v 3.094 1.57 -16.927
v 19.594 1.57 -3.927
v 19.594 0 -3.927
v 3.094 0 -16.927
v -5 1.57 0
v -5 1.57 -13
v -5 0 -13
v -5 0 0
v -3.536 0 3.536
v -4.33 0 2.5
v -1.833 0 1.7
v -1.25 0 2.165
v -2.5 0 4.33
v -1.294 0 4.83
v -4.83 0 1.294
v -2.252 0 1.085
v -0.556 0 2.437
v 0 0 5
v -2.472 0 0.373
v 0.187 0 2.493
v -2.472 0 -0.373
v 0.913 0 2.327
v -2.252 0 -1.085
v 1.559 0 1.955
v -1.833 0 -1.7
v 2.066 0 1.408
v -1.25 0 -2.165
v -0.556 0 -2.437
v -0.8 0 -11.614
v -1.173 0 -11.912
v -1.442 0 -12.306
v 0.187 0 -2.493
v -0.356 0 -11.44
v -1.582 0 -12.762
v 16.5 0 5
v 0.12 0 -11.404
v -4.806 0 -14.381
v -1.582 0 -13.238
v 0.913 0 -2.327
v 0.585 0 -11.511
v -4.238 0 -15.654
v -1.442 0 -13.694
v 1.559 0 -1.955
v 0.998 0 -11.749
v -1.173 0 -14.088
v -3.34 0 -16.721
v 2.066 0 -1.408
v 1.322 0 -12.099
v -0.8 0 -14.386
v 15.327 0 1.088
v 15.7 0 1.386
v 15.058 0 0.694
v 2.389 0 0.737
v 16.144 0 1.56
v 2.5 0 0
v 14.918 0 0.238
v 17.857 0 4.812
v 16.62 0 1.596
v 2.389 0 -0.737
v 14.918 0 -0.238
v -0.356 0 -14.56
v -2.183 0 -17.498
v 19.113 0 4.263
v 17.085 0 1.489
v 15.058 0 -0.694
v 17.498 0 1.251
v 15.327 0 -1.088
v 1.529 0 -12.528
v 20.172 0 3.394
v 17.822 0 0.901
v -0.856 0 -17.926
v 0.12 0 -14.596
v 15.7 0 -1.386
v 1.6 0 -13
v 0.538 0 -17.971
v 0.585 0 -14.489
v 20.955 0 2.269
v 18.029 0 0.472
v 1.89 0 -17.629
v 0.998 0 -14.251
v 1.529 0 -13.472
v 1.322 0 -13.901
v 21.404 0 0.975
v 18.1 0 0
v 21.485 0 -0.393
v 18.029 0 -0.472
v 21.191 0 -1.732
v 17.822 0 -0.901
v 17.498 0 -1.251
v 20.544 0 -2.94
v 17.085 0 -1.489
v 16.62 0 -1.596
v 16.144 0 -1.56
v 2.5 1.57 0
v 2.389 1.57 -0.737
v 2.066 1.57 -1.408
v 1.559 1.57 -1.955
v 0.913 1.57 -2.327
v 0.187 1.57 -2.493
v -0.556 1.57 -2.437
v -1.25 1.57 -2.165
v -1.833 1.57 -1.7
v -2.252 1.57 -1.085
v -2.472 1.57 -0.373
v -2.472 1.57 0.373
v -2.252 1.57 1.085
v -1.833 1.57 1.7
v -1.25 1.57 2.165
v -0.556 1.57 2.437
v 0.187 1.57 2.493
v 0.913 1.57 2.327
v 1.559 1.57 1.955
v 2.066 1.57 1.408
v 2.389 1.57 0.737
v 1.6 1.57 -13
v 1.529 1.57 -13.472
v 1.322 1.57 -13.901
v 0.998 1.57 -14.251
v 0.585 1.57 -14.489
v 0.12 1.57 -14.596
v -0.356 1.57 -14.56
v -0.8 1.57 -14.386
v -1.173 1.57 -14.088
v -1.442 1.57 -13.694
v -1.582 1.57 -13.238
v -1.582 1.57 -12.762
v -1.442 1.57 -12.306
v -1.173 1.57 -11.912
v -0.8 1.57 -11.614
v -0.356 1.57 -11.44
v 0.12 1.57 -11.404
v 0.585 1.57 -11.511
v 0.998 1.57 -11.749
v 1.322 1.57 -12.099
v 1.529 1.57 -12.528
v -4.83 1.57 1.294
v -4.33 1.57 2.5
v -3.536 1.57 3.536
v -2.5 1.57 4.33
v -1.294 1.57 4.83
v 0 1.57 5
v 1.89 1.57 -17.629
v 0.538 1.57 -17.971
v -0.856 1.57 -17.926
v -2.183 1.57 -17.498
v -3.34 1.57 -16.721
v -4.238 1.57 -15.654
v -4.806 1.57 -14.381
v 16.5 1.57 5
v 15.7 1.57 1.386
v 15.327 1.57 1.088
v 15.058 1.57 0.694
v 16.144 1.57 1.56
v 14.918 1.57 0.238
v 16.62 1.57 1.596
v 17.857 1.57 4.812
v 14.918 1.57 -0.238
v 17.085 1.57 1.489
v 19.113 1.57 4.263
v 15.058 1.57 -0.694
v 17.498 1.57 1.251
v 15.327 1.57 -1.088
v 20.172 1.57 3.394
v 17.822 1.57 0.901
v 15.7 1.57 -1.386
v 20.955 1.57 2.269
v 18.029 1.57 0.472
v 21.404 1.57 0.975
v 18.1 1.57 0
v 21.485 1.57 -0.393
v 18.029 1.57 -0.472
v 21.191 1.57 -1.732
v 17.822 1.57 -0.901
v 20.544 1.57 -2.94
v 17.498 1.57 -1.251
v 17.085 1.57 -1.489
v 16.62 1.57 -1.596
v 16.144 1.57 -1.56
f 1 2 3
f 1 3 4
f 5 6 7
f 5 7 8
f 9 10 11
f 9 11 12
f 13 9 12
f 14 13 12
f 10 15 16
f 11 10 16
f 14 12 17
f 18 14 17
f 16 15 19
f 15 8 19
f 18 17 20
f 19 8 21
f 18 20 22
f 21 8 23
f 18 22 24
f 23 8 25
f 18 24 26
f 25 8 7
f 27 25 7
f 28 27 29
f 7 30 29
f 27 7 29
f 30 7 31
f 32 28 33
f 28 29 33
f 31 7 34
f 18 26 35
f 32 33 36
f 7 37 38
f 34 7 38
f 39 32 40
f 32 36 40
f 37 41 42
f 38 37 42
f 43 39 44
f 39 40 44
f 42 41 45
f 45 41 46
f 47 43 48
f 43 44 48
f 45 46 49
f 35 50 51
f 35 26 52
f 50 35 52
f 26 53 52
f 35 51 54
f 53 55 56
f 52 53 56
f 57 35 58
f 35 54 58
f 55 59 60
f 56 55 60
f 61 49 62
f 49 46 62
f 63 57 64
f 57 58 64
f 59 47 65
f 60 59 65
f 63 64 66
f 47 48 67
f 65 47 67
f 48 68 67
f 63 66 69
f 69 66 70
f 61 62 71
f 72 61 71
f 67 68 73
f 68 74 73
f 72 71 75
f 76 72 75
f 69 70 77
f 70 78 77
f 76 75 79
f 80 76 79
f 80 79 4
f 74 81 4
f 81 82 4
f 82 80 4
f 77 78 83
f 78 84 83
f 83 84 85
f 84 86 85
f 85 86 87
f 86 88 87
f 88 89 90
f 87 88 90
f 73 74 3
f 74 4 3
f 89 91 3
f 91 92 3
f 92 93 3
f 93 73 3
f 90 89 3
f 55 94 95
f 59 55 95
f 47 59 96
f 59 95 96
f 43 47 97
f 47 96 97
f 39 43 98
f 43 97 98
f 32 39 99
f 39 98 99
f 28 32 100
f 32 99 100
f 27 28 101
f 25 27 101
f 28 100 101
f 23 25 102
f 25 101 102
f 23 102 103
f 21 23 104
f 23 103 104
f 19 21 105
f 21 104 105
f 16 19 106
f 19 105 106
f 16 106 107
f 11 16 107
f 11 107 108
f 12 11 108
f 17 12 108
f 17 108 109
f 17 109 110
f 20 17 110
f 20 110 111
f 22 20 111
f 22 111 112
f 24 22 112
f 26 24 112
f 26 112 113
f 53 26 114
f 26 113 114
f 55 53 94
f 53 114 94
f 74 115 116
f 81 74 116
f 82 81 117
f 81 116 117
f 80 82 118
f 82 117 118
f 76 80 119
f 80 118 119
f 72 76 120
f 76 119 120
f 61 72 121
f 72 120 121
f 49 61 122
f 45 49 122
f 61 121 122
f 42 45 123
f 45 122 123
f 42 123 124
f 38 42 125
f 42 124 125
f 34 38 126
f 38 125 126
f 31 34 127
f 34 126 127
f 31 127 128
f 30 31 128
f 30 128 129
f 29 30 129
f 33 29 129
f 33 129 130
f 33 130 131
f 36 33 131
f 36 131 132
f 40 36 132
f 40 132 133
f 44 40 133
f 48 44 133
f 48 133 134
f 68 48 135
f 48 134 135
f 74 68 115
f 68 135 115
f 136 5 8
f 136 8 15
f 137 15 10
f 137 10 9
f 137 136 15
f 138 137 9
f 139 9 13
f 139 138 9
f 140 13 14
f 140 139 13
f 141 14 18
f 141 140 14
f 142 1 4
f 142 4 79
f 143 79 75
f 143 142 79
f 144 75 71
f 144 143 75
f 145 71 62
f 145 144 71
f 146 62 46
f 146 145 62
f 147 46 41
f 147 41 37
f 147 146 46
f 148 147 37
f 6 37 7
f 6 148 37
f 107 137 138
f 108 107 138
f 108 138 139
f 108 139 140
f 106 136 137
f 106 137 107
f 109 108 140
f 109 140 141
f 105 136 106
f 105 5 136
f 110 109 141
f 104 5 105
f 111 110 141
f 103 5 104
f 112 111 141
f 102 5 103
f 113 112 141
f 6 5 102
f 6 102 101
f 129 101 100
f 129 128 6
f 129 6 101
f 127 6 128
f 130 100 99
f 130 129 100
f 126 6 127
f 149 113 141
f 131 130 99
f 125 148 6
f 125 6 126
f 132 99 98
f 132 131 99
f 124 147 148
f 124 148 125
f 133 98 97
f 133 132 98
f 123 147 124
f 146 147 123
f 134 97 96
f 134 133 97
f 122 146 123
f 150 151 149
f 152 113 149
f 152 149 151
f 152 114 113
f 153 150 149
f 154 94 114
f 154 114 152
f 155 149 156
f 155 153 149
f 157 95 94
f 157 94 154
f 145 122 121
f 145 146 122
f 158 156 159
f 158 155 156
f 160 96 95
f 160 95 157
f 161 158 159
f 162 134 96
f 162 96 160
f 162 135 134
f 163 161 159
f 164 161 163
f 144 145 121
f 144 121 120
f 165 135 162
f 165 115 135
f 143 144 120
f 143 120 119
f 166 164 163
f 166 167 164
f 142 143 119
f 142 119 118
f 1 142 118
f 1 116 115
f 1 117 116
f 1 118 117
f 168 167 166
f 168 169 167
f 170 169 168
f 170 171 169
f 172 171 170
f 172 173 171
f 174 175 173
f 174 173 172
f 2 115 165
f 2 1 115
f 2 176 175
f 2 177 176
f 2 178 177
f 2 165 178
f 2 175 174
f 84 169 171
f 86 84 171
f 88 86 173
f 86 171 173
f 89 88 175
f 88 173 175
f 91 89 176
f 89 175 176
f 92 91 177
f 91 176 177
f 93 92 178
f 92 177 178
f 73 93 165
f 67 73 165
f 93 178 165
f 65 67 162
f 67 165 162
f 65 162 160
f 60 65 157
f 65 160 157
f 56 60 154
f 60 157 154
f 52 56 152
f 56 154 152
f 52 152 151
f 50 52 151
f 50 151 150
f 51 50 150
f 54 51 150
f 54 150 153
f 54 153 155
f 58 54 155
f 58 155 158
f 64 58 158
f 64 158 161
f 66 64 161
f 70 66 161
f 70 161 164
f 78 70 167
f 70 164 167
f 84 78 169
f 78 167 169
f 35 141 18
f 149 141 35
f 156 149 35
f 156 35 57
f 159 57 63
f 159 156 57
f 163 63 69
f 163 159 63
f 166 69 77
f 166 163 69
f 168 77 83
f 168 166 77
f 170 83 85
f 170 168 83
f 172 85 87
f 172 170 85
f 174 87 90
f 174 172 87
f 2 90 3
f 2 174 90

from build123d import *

# Parameters (mm, degrees)
SKETCH1_R           = 1.6
SKETCH1_R_2         = 2.5
BOSS_EXTRUDE1_DEPTH = 1.57


with BuildPart() as part:
    # Sketch1 → Boss-Extrude1 (new body)
    with BuildSketch(Plane(origin=(0, 1.57, 0), x_dir=(1, 0, 0), z_dir=(0, 1, 0))):
        with BuildLine():
            Line((0, -5), (16.5, -5))
            ThreePointArc((16.5, -5), (21.224261413, -1.637484075), (19.594361133, 3.927458361))
            Line((19.594361133, 3.927458361), (3.094361133, 16.927458361))
            ThreePointArc((3.094361133, 16.927458361), (-2.182681188, 17.498433375), (-5, 13))
            Line((-5, 13), (-5, 0))
            ThreePointArc((-5, 0), (-3.535533906, -3.535533906), (0, -5))
        make_face()
        with Locations((0, 13)):
            Circle(SKETCH1_R, mode=Mode.SUBTRACT)
        with Locations((16.5, 0)):
            Circle(SKETCH1_R, mode=Mode.SUBTRACT)
        Circle(SKETCH1_R_2, mode=Mode.SUBTRACT)
    extrude(amount=-BOSS_EXTRUDE1_DEPTH)


solid = part.part
